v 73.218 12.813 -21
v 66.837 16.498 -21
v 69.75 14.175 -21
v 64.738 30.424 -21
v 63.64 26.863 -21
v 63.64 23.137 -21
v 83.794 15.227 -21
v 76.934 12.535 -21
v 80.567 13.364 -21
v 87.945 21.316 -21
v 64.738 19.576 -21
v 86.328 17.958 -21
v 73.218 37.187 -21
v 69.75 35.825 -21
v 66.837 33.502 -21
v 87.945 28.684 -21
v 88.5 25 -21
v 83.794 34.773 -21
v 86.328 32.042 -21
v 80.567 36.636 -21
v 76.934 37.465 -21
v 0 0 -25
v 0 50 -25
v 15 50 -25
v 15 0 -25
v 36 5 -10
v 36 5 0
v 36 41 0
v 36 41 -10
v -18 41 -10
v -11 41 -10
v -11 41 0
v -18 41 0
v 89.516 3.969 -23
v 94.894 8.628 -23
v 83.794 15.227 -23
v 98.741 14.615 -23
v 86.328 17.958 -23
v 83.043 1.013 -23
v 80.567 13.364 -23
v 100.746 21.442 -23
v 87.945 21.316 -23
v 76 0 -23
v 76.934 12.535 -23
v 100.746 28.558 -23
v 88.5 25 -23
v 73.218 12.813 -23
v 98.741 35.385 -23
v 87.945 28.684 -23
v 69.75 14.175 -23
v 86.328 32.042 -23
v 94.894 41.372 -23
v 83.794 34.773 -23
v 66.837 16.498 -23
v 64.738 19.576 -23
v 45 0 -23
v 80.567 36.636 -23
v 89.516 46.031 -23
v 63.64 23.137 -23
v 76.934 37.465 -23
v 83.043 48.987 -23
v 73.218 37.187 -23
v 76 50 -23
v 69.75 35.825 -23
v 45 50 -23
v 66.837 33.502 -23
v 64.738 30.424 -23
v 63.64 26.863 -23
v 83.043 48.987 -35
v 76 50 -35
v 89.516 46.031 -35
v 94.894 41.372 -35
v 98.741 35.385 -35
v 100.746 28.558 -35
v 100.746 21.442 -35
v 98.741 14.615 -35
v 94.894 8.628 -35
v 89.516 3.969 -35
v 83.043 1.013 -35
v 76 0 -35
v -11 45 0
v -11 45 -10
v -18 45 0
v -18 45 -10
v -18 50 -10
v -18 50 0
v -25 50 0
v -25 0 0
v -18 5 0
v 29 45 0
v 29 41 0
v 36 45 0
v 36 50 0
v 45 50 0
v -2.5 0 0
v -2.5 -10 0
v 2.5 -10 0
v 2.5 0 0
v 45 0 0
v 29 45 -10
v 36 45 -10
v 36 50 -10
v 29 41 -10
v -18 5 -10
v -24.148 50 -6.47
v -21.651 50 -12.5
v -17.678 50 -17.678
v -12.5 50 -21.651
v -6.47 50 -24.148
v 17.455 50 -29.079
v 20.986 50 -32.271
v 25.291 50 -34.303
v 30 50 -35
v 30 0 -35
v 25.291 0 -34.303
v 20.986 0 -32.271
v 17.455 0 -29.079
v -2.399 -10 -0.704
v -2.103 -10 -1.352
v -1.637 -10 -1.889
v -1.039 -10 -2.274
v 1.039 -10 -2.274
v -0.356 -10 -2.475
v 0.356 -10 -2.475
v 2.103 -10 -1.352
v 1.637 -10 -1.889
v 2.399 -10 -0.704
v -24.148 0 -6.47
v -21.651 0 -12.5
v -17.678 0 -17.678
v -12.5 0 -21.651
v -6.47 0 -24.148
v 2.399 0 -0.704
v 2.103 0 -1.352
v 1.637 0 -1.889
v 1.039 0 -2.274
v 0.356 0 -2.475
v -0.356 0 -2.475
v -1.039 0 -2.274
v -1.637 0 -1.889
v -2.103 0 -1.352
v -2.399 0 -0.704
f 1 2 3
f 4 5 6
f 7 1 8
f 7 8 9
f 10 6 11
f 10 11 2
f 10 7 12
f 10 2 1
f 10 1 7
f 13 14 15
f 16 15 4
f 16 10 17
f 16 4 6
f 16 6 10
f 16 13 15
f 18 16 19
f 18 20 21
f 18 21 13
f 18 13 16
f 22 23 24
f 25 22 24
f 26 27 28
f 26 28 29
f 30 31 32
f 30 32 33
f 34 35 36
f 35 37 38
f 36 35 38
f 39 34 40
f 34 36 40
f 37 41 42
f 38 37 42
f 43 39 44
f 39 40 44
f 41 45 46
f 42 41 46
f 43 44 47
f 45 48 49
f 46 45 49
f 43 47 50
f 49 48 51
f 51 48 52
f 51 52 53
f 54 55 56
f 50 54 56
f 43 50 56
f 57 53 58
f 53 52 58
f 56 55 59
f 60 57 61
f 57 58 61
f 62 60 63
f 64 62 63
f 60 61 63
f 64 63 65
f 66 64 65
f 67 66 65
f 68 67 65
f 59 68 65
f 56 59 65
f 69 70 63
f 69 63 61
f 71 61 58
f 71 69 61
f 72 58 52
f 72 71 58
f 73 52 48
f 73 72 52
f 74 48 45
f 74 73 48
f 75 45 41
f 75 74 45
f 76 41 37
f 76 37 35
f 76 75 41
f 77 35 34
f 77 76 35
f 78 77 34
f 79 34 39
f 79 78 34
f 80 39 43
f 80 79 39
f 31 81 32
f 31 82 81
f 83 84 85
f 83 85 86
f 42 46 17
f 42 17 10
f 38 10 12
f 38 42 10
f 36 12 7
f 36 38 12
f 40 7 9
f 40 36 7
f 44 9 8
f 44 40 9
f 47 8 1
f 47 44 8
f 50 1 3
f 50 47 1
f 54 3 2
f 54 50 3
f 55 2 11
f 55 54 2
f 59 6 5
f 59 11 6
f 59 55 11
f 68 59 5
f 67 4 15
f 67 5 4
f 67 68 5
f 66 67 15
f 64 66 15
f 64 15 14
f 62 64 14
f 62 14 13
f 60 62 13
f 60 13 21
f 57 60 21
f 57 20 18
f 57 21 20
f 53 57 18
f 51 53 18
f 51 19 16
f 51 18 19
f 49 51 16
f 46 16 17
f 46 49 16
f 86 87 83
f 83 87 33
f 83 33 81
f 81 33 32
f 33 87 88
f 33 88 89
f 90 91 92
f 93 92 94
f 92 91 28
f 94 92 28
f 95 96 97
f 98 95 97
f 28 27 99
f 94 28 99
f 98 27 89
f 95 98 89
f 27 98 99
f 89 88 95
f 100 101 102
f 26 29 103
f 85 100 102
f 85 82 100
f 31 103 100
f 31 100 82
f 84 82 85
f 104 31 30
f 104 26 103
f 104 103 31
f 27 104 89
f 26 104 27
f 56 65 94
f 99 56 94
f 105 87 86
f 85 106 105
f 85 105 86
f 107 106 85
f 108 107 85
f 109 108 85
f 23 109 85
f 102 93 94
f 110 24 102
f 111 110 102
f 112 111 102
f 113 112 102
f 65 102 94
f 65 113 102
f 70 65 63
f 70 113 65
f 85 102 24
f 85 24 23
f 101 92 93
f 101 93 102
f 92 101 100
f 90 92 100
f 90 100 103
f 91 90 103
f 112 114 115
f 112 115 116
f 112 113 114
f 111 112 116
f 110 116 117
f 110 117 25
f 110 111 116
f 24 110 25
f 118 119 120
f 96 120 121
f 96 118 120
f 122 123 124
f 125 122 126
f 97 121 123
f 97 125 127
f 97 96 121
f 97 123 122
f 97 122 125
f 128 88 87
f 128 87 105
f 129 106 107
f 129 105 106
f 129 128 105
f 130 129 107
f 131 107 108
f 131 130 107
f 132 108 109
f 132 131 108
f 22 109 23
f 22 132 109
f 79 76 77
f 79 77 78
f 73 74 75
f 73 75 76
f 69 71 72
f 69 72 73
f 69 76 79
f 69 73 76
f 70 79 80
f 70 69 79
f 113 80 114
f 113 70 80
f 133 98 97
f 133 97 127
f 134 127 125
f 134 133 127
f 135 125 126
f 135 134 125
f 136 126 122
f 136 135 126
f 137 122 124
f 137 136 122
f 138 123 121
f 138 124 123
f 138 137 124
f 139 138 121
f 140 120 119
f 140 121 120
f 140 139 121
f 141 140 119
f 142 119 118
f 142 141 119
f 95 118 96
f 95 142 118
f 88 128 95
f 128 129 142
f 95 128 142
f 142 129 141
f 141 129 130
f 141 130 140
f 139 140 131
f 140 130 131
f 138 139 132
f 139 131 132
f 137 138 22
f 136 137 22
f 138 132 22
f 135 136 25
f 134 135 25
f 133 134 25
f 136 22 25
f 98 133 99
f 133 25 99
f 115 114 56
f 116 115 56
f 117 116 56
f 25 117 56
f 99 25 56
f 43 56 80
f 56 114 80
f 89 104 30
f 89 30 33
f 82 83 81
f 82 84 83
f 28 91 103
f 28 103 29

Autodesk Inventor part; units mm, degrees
ref_plane "YZ Plane" through (0, 0, 0) normal (1, 0, 0) x (0, 1, 0)
ref_plane "XZ Plane" through (0, 0, 0) normal (0, 1, 0) x (-1, 0, 0)
sketch "Sketch1" plane through (0, 0, 0) normal (0, 1, 0) x (-1, 0, 0)
  arc A0 (0, -25) -> (25, 0) centre (0, 0) ccw
  line L0 (25, 0) -> (0, 0) construction
  line L1 (0, -25) -> (0, 0) construction
  arc A1 (25, 0) -> (-25, 0) centre (0, 0) ccw construction
  arc A2 (-25, 0) -> (0, -25) centre (0, 0) ccw construction
  line L2 (18, 10) -> (-36, 10)
  line L3 (-36, 10) -> (-36, -10)
  line L4 (-36, -10) -> (18, -10)
  line L5 (18, -10) -> (18, 10)
  line L6 (11, 10) -> (11, -10)
  line L7 (-29, 10) -> (-29, -10)
  line L8 (0, -25) -> (-45, -25)
  line L9 (-45, -25) -> (-45, 0)
  line L10 (-45, 0) -> (-36, 0)
  line L11 (25, 0) -> (18, 0)
  point P0 (11, 0)
  dimension "d0" = 50
  dimension "d1" = 20
  dimension "d2" = 10
  dimension "d3" = 54
  dimension "d4" = 7
  dimension "d5" = 7
  dimension "d7" = 11
  dimension "d8" = 45
extrude "Extrusion1" add sketch "Sketch1" along normal blind 50 contours L8 L9 L10 L3 L4 L5 L11 A0
sketch "Sketch2" plane through (-18, 0, -10) normal (0, 0, 1) x (1, 0, 0)
  line L0 (7, 50) -> (7, 41) construction
  line L1 (7, 41) -> (0, 41) construction
  line L2 (0, 41) -> (0, 38) construction
  line L3 (0, 0) -> (0, 50) construction
  line L4 (0, 38) -> (7, 38) construction
  line L5 (7, 38) -> (7, 18) construction
  line L6 (7, 18) -> (2, 18) construction
  line L7 (2, 18) -> (2, 15) construction
  line L8 (2, 15) -> (7, 15) construction
  line L9 (7, 15) -> (7, 10) construction
  line L10 (7, 10) -> (47, 10) construction
  line L11 (47, 10) -> (47, 38) construction
  line L12 (47, 38) -> (54, 38) construction
  line L13 (54, 0) -> (54, 50) construction
  line L14 (54, 38) -> (54, 41) construction
  line L15 (54, 41) -> (47, 41) construction
  line L16 (47, 50) -> (20.5, 50) construction
  line L17 (20.5, 50) -> (20.5, 55) construction
  line L18 (20.5, 55) -> (15.5, 55) construction
  line L19 (15.5, 55) -> (15.5, 50) construction
  line L20 (15.5, 50) -> (7, 50) construction
  line L21 (47, 50) -> (47, 41) construction
  line L22 (0, 50) -> (54, 50) construction
  line L23 (7, 41) -> (0, 41)
  line L24 (0, 41) -> (0, 45)
  line L25 (0, 45) -> (7, 45)
  line L26 (7, 45) -> (7, 41)
  line L27 (47, 41) -> (54, 41)
  line L28 (54, 41) -> (54, 45)
  line L29 (54, 45) -> (47, 45)
  line L30 (47, 45) -> (47, 41)
  line L31 (0, 0) -> (0, 50) projected
  line L32 (0, 5) -> (54, 5)
  line L33 (54, 5) -> (54, 0)
  line L34 (54, 0) -> (0, 0)
  line L35 (0, 0) -> (0, 5)
  point P0 (18, 0)
  point P1 (4.5, 18)
  point P2 (3.5, 38)
  point P3 (18, 55)
  dimension "d11" = 40
  dimension "d12" = 3
  dimension "d13" = 3
  dimension "d16" = 9
  dimension "d17" = 5
  dimension "d18" = 5
  dimension "d19" = 7
  dimension "d20" = 7
  dimension "d21" = 5
  dimension "d22" = 5
  dimension "d23" = 11
  dimension "d24" = 4
  dimension "d29" = 5
extrude "Extrusion2" add sketch "Sketch2" along normal up to surface (10 mm away)
sketch "Sketch4" plane through (0, 0, 0) normal (0, -1, 0) x (1, 0, 0)
  line L0 (-18, 0) -> (36, 0) projected
  circle A0 centre (0, 0) radius 2.5
  point P0 (2.5, 0)
  point P1 (-2.5, 0)
  dimension "d31" = 5
extrude "Extrusion3" add sketch "Sketch4" along normal blind 10 contours L0 A0 picked at (-0.4734, -0.6858)
sketch "Sketch5" plane through (45, 0, 0) normal (1, 0, 0) x (0, 0, -1)
  line L0 (15, 35) -> (-25, 35)
  line L1 (-25, 35) -> (-25, 15)
  line L2 (-25, 15) -> (15, 15)
  line L3 (15, 15) -> (15, 35)
  line L4 (6, 35) -> (6, 15)
  line L5 (3, 35) -> (3, 15)
  line L6 (-17, 30) -> (-20, 30) construction
  line L7 (-20, 30) -> (-20, 20) construction
  line L8 (-20, 20) -> (-17, 20) construction
  line L9 (-17, 20) -> (-17, 30) construction
  line L10 (0, 5) -> (0, 41) projected
  line L11 (15, 27.5) -> (20, 27.5)
  line L12 (20, 27.5) -> (20, 22.5)
  line L13 (20, 22.5) -> (15, 22.5)
  line L14 (0, 50) -> (25, 50) projected
  point P0 (0, 0)
  point P1 (15, 25)
  dimension "d34" = 20
  dimension "d35" = 5
  dimension "d36" = 5
  dimension "d37" = 5
  dimension "d38" = 3
  dimension "d39" = 40
  dimension "d40" = 9
  dimension "d41" = 3
  dimension "d42" = 25
  dimension "d43" = 5
  dimension "d44" = 5
  dimension "d45" = 2.5
  dimension "d48" = 25
ref_plane "Work Plane1" through (45, 0, -35) normal (0, 0, -1) x (-1, 0, 0)
sketch "Sketch6" plane through (45, 0, -35) normal (0, 0, -1) x (-1, 0, 0)
  circle A0 centre (-31, 25) radius 12.5
  circle A1 centre (-31, 25) radius 25
  line L0 (0, 0) -> (0, 50) projected
  line L1 (0, 25) -> (-26, 25) construction
  line L2 (-31, 50) -> (0, 50)
  line L3 (0, 0) -> (45, 0) projected
  line L4 (0, 0) -> (-31, 0)
  point P0 (0, 25)
  dimension "d50" = 25
  dimension "d51" = 50
  dimension "d52" = 31
extrude "Extrusion4" add sketch "Sketch6" against normal blind 12 contours A0 | A1 | A1 L2 L0 L4
sketch "Sketch7" plane through (0, 50, 0) normal (0, 1, 0) x (1, 0, 0)
  arc A0 (0, 25) -> (-25, 0) centre (0, 0) ccw projected
  line L0 (-18, 0) -> (36, 0) projected
  line L1 (-25, 0) -> (-18, 0) projected
  line L2 (45, 35) -> (45, 25) projected
  line L3 (45, 35) -> (30, 35)
  line L4 (45, 25) -> (0, 25) projected
  arc A1 (30, 35) -> (15, 25) centre (30, 18.75) ccw
  dimension "d56" = 15
  dimension "d59" = 15
  dimension "d60" = 10
extrude "Extrusion5" add sketch "Sketch7" against normal up to surface (50 mm away)
sketch "Sketch8" plane through (45, 0, -23) normal (0, 0, 1) x (1, 0, 0)
  circle A0 centre (31, 25) radius 12.5
  arc A1 (31, 0) -> (31, 50) centre (31, 25) ccw projected
  point P0 (-45, 0)
  dimension "d63" = 25
extrude "Extrusion6" add sketch "Sketch8" along normal blind 2
equation "\"d59\" = 1.5 * d60"
